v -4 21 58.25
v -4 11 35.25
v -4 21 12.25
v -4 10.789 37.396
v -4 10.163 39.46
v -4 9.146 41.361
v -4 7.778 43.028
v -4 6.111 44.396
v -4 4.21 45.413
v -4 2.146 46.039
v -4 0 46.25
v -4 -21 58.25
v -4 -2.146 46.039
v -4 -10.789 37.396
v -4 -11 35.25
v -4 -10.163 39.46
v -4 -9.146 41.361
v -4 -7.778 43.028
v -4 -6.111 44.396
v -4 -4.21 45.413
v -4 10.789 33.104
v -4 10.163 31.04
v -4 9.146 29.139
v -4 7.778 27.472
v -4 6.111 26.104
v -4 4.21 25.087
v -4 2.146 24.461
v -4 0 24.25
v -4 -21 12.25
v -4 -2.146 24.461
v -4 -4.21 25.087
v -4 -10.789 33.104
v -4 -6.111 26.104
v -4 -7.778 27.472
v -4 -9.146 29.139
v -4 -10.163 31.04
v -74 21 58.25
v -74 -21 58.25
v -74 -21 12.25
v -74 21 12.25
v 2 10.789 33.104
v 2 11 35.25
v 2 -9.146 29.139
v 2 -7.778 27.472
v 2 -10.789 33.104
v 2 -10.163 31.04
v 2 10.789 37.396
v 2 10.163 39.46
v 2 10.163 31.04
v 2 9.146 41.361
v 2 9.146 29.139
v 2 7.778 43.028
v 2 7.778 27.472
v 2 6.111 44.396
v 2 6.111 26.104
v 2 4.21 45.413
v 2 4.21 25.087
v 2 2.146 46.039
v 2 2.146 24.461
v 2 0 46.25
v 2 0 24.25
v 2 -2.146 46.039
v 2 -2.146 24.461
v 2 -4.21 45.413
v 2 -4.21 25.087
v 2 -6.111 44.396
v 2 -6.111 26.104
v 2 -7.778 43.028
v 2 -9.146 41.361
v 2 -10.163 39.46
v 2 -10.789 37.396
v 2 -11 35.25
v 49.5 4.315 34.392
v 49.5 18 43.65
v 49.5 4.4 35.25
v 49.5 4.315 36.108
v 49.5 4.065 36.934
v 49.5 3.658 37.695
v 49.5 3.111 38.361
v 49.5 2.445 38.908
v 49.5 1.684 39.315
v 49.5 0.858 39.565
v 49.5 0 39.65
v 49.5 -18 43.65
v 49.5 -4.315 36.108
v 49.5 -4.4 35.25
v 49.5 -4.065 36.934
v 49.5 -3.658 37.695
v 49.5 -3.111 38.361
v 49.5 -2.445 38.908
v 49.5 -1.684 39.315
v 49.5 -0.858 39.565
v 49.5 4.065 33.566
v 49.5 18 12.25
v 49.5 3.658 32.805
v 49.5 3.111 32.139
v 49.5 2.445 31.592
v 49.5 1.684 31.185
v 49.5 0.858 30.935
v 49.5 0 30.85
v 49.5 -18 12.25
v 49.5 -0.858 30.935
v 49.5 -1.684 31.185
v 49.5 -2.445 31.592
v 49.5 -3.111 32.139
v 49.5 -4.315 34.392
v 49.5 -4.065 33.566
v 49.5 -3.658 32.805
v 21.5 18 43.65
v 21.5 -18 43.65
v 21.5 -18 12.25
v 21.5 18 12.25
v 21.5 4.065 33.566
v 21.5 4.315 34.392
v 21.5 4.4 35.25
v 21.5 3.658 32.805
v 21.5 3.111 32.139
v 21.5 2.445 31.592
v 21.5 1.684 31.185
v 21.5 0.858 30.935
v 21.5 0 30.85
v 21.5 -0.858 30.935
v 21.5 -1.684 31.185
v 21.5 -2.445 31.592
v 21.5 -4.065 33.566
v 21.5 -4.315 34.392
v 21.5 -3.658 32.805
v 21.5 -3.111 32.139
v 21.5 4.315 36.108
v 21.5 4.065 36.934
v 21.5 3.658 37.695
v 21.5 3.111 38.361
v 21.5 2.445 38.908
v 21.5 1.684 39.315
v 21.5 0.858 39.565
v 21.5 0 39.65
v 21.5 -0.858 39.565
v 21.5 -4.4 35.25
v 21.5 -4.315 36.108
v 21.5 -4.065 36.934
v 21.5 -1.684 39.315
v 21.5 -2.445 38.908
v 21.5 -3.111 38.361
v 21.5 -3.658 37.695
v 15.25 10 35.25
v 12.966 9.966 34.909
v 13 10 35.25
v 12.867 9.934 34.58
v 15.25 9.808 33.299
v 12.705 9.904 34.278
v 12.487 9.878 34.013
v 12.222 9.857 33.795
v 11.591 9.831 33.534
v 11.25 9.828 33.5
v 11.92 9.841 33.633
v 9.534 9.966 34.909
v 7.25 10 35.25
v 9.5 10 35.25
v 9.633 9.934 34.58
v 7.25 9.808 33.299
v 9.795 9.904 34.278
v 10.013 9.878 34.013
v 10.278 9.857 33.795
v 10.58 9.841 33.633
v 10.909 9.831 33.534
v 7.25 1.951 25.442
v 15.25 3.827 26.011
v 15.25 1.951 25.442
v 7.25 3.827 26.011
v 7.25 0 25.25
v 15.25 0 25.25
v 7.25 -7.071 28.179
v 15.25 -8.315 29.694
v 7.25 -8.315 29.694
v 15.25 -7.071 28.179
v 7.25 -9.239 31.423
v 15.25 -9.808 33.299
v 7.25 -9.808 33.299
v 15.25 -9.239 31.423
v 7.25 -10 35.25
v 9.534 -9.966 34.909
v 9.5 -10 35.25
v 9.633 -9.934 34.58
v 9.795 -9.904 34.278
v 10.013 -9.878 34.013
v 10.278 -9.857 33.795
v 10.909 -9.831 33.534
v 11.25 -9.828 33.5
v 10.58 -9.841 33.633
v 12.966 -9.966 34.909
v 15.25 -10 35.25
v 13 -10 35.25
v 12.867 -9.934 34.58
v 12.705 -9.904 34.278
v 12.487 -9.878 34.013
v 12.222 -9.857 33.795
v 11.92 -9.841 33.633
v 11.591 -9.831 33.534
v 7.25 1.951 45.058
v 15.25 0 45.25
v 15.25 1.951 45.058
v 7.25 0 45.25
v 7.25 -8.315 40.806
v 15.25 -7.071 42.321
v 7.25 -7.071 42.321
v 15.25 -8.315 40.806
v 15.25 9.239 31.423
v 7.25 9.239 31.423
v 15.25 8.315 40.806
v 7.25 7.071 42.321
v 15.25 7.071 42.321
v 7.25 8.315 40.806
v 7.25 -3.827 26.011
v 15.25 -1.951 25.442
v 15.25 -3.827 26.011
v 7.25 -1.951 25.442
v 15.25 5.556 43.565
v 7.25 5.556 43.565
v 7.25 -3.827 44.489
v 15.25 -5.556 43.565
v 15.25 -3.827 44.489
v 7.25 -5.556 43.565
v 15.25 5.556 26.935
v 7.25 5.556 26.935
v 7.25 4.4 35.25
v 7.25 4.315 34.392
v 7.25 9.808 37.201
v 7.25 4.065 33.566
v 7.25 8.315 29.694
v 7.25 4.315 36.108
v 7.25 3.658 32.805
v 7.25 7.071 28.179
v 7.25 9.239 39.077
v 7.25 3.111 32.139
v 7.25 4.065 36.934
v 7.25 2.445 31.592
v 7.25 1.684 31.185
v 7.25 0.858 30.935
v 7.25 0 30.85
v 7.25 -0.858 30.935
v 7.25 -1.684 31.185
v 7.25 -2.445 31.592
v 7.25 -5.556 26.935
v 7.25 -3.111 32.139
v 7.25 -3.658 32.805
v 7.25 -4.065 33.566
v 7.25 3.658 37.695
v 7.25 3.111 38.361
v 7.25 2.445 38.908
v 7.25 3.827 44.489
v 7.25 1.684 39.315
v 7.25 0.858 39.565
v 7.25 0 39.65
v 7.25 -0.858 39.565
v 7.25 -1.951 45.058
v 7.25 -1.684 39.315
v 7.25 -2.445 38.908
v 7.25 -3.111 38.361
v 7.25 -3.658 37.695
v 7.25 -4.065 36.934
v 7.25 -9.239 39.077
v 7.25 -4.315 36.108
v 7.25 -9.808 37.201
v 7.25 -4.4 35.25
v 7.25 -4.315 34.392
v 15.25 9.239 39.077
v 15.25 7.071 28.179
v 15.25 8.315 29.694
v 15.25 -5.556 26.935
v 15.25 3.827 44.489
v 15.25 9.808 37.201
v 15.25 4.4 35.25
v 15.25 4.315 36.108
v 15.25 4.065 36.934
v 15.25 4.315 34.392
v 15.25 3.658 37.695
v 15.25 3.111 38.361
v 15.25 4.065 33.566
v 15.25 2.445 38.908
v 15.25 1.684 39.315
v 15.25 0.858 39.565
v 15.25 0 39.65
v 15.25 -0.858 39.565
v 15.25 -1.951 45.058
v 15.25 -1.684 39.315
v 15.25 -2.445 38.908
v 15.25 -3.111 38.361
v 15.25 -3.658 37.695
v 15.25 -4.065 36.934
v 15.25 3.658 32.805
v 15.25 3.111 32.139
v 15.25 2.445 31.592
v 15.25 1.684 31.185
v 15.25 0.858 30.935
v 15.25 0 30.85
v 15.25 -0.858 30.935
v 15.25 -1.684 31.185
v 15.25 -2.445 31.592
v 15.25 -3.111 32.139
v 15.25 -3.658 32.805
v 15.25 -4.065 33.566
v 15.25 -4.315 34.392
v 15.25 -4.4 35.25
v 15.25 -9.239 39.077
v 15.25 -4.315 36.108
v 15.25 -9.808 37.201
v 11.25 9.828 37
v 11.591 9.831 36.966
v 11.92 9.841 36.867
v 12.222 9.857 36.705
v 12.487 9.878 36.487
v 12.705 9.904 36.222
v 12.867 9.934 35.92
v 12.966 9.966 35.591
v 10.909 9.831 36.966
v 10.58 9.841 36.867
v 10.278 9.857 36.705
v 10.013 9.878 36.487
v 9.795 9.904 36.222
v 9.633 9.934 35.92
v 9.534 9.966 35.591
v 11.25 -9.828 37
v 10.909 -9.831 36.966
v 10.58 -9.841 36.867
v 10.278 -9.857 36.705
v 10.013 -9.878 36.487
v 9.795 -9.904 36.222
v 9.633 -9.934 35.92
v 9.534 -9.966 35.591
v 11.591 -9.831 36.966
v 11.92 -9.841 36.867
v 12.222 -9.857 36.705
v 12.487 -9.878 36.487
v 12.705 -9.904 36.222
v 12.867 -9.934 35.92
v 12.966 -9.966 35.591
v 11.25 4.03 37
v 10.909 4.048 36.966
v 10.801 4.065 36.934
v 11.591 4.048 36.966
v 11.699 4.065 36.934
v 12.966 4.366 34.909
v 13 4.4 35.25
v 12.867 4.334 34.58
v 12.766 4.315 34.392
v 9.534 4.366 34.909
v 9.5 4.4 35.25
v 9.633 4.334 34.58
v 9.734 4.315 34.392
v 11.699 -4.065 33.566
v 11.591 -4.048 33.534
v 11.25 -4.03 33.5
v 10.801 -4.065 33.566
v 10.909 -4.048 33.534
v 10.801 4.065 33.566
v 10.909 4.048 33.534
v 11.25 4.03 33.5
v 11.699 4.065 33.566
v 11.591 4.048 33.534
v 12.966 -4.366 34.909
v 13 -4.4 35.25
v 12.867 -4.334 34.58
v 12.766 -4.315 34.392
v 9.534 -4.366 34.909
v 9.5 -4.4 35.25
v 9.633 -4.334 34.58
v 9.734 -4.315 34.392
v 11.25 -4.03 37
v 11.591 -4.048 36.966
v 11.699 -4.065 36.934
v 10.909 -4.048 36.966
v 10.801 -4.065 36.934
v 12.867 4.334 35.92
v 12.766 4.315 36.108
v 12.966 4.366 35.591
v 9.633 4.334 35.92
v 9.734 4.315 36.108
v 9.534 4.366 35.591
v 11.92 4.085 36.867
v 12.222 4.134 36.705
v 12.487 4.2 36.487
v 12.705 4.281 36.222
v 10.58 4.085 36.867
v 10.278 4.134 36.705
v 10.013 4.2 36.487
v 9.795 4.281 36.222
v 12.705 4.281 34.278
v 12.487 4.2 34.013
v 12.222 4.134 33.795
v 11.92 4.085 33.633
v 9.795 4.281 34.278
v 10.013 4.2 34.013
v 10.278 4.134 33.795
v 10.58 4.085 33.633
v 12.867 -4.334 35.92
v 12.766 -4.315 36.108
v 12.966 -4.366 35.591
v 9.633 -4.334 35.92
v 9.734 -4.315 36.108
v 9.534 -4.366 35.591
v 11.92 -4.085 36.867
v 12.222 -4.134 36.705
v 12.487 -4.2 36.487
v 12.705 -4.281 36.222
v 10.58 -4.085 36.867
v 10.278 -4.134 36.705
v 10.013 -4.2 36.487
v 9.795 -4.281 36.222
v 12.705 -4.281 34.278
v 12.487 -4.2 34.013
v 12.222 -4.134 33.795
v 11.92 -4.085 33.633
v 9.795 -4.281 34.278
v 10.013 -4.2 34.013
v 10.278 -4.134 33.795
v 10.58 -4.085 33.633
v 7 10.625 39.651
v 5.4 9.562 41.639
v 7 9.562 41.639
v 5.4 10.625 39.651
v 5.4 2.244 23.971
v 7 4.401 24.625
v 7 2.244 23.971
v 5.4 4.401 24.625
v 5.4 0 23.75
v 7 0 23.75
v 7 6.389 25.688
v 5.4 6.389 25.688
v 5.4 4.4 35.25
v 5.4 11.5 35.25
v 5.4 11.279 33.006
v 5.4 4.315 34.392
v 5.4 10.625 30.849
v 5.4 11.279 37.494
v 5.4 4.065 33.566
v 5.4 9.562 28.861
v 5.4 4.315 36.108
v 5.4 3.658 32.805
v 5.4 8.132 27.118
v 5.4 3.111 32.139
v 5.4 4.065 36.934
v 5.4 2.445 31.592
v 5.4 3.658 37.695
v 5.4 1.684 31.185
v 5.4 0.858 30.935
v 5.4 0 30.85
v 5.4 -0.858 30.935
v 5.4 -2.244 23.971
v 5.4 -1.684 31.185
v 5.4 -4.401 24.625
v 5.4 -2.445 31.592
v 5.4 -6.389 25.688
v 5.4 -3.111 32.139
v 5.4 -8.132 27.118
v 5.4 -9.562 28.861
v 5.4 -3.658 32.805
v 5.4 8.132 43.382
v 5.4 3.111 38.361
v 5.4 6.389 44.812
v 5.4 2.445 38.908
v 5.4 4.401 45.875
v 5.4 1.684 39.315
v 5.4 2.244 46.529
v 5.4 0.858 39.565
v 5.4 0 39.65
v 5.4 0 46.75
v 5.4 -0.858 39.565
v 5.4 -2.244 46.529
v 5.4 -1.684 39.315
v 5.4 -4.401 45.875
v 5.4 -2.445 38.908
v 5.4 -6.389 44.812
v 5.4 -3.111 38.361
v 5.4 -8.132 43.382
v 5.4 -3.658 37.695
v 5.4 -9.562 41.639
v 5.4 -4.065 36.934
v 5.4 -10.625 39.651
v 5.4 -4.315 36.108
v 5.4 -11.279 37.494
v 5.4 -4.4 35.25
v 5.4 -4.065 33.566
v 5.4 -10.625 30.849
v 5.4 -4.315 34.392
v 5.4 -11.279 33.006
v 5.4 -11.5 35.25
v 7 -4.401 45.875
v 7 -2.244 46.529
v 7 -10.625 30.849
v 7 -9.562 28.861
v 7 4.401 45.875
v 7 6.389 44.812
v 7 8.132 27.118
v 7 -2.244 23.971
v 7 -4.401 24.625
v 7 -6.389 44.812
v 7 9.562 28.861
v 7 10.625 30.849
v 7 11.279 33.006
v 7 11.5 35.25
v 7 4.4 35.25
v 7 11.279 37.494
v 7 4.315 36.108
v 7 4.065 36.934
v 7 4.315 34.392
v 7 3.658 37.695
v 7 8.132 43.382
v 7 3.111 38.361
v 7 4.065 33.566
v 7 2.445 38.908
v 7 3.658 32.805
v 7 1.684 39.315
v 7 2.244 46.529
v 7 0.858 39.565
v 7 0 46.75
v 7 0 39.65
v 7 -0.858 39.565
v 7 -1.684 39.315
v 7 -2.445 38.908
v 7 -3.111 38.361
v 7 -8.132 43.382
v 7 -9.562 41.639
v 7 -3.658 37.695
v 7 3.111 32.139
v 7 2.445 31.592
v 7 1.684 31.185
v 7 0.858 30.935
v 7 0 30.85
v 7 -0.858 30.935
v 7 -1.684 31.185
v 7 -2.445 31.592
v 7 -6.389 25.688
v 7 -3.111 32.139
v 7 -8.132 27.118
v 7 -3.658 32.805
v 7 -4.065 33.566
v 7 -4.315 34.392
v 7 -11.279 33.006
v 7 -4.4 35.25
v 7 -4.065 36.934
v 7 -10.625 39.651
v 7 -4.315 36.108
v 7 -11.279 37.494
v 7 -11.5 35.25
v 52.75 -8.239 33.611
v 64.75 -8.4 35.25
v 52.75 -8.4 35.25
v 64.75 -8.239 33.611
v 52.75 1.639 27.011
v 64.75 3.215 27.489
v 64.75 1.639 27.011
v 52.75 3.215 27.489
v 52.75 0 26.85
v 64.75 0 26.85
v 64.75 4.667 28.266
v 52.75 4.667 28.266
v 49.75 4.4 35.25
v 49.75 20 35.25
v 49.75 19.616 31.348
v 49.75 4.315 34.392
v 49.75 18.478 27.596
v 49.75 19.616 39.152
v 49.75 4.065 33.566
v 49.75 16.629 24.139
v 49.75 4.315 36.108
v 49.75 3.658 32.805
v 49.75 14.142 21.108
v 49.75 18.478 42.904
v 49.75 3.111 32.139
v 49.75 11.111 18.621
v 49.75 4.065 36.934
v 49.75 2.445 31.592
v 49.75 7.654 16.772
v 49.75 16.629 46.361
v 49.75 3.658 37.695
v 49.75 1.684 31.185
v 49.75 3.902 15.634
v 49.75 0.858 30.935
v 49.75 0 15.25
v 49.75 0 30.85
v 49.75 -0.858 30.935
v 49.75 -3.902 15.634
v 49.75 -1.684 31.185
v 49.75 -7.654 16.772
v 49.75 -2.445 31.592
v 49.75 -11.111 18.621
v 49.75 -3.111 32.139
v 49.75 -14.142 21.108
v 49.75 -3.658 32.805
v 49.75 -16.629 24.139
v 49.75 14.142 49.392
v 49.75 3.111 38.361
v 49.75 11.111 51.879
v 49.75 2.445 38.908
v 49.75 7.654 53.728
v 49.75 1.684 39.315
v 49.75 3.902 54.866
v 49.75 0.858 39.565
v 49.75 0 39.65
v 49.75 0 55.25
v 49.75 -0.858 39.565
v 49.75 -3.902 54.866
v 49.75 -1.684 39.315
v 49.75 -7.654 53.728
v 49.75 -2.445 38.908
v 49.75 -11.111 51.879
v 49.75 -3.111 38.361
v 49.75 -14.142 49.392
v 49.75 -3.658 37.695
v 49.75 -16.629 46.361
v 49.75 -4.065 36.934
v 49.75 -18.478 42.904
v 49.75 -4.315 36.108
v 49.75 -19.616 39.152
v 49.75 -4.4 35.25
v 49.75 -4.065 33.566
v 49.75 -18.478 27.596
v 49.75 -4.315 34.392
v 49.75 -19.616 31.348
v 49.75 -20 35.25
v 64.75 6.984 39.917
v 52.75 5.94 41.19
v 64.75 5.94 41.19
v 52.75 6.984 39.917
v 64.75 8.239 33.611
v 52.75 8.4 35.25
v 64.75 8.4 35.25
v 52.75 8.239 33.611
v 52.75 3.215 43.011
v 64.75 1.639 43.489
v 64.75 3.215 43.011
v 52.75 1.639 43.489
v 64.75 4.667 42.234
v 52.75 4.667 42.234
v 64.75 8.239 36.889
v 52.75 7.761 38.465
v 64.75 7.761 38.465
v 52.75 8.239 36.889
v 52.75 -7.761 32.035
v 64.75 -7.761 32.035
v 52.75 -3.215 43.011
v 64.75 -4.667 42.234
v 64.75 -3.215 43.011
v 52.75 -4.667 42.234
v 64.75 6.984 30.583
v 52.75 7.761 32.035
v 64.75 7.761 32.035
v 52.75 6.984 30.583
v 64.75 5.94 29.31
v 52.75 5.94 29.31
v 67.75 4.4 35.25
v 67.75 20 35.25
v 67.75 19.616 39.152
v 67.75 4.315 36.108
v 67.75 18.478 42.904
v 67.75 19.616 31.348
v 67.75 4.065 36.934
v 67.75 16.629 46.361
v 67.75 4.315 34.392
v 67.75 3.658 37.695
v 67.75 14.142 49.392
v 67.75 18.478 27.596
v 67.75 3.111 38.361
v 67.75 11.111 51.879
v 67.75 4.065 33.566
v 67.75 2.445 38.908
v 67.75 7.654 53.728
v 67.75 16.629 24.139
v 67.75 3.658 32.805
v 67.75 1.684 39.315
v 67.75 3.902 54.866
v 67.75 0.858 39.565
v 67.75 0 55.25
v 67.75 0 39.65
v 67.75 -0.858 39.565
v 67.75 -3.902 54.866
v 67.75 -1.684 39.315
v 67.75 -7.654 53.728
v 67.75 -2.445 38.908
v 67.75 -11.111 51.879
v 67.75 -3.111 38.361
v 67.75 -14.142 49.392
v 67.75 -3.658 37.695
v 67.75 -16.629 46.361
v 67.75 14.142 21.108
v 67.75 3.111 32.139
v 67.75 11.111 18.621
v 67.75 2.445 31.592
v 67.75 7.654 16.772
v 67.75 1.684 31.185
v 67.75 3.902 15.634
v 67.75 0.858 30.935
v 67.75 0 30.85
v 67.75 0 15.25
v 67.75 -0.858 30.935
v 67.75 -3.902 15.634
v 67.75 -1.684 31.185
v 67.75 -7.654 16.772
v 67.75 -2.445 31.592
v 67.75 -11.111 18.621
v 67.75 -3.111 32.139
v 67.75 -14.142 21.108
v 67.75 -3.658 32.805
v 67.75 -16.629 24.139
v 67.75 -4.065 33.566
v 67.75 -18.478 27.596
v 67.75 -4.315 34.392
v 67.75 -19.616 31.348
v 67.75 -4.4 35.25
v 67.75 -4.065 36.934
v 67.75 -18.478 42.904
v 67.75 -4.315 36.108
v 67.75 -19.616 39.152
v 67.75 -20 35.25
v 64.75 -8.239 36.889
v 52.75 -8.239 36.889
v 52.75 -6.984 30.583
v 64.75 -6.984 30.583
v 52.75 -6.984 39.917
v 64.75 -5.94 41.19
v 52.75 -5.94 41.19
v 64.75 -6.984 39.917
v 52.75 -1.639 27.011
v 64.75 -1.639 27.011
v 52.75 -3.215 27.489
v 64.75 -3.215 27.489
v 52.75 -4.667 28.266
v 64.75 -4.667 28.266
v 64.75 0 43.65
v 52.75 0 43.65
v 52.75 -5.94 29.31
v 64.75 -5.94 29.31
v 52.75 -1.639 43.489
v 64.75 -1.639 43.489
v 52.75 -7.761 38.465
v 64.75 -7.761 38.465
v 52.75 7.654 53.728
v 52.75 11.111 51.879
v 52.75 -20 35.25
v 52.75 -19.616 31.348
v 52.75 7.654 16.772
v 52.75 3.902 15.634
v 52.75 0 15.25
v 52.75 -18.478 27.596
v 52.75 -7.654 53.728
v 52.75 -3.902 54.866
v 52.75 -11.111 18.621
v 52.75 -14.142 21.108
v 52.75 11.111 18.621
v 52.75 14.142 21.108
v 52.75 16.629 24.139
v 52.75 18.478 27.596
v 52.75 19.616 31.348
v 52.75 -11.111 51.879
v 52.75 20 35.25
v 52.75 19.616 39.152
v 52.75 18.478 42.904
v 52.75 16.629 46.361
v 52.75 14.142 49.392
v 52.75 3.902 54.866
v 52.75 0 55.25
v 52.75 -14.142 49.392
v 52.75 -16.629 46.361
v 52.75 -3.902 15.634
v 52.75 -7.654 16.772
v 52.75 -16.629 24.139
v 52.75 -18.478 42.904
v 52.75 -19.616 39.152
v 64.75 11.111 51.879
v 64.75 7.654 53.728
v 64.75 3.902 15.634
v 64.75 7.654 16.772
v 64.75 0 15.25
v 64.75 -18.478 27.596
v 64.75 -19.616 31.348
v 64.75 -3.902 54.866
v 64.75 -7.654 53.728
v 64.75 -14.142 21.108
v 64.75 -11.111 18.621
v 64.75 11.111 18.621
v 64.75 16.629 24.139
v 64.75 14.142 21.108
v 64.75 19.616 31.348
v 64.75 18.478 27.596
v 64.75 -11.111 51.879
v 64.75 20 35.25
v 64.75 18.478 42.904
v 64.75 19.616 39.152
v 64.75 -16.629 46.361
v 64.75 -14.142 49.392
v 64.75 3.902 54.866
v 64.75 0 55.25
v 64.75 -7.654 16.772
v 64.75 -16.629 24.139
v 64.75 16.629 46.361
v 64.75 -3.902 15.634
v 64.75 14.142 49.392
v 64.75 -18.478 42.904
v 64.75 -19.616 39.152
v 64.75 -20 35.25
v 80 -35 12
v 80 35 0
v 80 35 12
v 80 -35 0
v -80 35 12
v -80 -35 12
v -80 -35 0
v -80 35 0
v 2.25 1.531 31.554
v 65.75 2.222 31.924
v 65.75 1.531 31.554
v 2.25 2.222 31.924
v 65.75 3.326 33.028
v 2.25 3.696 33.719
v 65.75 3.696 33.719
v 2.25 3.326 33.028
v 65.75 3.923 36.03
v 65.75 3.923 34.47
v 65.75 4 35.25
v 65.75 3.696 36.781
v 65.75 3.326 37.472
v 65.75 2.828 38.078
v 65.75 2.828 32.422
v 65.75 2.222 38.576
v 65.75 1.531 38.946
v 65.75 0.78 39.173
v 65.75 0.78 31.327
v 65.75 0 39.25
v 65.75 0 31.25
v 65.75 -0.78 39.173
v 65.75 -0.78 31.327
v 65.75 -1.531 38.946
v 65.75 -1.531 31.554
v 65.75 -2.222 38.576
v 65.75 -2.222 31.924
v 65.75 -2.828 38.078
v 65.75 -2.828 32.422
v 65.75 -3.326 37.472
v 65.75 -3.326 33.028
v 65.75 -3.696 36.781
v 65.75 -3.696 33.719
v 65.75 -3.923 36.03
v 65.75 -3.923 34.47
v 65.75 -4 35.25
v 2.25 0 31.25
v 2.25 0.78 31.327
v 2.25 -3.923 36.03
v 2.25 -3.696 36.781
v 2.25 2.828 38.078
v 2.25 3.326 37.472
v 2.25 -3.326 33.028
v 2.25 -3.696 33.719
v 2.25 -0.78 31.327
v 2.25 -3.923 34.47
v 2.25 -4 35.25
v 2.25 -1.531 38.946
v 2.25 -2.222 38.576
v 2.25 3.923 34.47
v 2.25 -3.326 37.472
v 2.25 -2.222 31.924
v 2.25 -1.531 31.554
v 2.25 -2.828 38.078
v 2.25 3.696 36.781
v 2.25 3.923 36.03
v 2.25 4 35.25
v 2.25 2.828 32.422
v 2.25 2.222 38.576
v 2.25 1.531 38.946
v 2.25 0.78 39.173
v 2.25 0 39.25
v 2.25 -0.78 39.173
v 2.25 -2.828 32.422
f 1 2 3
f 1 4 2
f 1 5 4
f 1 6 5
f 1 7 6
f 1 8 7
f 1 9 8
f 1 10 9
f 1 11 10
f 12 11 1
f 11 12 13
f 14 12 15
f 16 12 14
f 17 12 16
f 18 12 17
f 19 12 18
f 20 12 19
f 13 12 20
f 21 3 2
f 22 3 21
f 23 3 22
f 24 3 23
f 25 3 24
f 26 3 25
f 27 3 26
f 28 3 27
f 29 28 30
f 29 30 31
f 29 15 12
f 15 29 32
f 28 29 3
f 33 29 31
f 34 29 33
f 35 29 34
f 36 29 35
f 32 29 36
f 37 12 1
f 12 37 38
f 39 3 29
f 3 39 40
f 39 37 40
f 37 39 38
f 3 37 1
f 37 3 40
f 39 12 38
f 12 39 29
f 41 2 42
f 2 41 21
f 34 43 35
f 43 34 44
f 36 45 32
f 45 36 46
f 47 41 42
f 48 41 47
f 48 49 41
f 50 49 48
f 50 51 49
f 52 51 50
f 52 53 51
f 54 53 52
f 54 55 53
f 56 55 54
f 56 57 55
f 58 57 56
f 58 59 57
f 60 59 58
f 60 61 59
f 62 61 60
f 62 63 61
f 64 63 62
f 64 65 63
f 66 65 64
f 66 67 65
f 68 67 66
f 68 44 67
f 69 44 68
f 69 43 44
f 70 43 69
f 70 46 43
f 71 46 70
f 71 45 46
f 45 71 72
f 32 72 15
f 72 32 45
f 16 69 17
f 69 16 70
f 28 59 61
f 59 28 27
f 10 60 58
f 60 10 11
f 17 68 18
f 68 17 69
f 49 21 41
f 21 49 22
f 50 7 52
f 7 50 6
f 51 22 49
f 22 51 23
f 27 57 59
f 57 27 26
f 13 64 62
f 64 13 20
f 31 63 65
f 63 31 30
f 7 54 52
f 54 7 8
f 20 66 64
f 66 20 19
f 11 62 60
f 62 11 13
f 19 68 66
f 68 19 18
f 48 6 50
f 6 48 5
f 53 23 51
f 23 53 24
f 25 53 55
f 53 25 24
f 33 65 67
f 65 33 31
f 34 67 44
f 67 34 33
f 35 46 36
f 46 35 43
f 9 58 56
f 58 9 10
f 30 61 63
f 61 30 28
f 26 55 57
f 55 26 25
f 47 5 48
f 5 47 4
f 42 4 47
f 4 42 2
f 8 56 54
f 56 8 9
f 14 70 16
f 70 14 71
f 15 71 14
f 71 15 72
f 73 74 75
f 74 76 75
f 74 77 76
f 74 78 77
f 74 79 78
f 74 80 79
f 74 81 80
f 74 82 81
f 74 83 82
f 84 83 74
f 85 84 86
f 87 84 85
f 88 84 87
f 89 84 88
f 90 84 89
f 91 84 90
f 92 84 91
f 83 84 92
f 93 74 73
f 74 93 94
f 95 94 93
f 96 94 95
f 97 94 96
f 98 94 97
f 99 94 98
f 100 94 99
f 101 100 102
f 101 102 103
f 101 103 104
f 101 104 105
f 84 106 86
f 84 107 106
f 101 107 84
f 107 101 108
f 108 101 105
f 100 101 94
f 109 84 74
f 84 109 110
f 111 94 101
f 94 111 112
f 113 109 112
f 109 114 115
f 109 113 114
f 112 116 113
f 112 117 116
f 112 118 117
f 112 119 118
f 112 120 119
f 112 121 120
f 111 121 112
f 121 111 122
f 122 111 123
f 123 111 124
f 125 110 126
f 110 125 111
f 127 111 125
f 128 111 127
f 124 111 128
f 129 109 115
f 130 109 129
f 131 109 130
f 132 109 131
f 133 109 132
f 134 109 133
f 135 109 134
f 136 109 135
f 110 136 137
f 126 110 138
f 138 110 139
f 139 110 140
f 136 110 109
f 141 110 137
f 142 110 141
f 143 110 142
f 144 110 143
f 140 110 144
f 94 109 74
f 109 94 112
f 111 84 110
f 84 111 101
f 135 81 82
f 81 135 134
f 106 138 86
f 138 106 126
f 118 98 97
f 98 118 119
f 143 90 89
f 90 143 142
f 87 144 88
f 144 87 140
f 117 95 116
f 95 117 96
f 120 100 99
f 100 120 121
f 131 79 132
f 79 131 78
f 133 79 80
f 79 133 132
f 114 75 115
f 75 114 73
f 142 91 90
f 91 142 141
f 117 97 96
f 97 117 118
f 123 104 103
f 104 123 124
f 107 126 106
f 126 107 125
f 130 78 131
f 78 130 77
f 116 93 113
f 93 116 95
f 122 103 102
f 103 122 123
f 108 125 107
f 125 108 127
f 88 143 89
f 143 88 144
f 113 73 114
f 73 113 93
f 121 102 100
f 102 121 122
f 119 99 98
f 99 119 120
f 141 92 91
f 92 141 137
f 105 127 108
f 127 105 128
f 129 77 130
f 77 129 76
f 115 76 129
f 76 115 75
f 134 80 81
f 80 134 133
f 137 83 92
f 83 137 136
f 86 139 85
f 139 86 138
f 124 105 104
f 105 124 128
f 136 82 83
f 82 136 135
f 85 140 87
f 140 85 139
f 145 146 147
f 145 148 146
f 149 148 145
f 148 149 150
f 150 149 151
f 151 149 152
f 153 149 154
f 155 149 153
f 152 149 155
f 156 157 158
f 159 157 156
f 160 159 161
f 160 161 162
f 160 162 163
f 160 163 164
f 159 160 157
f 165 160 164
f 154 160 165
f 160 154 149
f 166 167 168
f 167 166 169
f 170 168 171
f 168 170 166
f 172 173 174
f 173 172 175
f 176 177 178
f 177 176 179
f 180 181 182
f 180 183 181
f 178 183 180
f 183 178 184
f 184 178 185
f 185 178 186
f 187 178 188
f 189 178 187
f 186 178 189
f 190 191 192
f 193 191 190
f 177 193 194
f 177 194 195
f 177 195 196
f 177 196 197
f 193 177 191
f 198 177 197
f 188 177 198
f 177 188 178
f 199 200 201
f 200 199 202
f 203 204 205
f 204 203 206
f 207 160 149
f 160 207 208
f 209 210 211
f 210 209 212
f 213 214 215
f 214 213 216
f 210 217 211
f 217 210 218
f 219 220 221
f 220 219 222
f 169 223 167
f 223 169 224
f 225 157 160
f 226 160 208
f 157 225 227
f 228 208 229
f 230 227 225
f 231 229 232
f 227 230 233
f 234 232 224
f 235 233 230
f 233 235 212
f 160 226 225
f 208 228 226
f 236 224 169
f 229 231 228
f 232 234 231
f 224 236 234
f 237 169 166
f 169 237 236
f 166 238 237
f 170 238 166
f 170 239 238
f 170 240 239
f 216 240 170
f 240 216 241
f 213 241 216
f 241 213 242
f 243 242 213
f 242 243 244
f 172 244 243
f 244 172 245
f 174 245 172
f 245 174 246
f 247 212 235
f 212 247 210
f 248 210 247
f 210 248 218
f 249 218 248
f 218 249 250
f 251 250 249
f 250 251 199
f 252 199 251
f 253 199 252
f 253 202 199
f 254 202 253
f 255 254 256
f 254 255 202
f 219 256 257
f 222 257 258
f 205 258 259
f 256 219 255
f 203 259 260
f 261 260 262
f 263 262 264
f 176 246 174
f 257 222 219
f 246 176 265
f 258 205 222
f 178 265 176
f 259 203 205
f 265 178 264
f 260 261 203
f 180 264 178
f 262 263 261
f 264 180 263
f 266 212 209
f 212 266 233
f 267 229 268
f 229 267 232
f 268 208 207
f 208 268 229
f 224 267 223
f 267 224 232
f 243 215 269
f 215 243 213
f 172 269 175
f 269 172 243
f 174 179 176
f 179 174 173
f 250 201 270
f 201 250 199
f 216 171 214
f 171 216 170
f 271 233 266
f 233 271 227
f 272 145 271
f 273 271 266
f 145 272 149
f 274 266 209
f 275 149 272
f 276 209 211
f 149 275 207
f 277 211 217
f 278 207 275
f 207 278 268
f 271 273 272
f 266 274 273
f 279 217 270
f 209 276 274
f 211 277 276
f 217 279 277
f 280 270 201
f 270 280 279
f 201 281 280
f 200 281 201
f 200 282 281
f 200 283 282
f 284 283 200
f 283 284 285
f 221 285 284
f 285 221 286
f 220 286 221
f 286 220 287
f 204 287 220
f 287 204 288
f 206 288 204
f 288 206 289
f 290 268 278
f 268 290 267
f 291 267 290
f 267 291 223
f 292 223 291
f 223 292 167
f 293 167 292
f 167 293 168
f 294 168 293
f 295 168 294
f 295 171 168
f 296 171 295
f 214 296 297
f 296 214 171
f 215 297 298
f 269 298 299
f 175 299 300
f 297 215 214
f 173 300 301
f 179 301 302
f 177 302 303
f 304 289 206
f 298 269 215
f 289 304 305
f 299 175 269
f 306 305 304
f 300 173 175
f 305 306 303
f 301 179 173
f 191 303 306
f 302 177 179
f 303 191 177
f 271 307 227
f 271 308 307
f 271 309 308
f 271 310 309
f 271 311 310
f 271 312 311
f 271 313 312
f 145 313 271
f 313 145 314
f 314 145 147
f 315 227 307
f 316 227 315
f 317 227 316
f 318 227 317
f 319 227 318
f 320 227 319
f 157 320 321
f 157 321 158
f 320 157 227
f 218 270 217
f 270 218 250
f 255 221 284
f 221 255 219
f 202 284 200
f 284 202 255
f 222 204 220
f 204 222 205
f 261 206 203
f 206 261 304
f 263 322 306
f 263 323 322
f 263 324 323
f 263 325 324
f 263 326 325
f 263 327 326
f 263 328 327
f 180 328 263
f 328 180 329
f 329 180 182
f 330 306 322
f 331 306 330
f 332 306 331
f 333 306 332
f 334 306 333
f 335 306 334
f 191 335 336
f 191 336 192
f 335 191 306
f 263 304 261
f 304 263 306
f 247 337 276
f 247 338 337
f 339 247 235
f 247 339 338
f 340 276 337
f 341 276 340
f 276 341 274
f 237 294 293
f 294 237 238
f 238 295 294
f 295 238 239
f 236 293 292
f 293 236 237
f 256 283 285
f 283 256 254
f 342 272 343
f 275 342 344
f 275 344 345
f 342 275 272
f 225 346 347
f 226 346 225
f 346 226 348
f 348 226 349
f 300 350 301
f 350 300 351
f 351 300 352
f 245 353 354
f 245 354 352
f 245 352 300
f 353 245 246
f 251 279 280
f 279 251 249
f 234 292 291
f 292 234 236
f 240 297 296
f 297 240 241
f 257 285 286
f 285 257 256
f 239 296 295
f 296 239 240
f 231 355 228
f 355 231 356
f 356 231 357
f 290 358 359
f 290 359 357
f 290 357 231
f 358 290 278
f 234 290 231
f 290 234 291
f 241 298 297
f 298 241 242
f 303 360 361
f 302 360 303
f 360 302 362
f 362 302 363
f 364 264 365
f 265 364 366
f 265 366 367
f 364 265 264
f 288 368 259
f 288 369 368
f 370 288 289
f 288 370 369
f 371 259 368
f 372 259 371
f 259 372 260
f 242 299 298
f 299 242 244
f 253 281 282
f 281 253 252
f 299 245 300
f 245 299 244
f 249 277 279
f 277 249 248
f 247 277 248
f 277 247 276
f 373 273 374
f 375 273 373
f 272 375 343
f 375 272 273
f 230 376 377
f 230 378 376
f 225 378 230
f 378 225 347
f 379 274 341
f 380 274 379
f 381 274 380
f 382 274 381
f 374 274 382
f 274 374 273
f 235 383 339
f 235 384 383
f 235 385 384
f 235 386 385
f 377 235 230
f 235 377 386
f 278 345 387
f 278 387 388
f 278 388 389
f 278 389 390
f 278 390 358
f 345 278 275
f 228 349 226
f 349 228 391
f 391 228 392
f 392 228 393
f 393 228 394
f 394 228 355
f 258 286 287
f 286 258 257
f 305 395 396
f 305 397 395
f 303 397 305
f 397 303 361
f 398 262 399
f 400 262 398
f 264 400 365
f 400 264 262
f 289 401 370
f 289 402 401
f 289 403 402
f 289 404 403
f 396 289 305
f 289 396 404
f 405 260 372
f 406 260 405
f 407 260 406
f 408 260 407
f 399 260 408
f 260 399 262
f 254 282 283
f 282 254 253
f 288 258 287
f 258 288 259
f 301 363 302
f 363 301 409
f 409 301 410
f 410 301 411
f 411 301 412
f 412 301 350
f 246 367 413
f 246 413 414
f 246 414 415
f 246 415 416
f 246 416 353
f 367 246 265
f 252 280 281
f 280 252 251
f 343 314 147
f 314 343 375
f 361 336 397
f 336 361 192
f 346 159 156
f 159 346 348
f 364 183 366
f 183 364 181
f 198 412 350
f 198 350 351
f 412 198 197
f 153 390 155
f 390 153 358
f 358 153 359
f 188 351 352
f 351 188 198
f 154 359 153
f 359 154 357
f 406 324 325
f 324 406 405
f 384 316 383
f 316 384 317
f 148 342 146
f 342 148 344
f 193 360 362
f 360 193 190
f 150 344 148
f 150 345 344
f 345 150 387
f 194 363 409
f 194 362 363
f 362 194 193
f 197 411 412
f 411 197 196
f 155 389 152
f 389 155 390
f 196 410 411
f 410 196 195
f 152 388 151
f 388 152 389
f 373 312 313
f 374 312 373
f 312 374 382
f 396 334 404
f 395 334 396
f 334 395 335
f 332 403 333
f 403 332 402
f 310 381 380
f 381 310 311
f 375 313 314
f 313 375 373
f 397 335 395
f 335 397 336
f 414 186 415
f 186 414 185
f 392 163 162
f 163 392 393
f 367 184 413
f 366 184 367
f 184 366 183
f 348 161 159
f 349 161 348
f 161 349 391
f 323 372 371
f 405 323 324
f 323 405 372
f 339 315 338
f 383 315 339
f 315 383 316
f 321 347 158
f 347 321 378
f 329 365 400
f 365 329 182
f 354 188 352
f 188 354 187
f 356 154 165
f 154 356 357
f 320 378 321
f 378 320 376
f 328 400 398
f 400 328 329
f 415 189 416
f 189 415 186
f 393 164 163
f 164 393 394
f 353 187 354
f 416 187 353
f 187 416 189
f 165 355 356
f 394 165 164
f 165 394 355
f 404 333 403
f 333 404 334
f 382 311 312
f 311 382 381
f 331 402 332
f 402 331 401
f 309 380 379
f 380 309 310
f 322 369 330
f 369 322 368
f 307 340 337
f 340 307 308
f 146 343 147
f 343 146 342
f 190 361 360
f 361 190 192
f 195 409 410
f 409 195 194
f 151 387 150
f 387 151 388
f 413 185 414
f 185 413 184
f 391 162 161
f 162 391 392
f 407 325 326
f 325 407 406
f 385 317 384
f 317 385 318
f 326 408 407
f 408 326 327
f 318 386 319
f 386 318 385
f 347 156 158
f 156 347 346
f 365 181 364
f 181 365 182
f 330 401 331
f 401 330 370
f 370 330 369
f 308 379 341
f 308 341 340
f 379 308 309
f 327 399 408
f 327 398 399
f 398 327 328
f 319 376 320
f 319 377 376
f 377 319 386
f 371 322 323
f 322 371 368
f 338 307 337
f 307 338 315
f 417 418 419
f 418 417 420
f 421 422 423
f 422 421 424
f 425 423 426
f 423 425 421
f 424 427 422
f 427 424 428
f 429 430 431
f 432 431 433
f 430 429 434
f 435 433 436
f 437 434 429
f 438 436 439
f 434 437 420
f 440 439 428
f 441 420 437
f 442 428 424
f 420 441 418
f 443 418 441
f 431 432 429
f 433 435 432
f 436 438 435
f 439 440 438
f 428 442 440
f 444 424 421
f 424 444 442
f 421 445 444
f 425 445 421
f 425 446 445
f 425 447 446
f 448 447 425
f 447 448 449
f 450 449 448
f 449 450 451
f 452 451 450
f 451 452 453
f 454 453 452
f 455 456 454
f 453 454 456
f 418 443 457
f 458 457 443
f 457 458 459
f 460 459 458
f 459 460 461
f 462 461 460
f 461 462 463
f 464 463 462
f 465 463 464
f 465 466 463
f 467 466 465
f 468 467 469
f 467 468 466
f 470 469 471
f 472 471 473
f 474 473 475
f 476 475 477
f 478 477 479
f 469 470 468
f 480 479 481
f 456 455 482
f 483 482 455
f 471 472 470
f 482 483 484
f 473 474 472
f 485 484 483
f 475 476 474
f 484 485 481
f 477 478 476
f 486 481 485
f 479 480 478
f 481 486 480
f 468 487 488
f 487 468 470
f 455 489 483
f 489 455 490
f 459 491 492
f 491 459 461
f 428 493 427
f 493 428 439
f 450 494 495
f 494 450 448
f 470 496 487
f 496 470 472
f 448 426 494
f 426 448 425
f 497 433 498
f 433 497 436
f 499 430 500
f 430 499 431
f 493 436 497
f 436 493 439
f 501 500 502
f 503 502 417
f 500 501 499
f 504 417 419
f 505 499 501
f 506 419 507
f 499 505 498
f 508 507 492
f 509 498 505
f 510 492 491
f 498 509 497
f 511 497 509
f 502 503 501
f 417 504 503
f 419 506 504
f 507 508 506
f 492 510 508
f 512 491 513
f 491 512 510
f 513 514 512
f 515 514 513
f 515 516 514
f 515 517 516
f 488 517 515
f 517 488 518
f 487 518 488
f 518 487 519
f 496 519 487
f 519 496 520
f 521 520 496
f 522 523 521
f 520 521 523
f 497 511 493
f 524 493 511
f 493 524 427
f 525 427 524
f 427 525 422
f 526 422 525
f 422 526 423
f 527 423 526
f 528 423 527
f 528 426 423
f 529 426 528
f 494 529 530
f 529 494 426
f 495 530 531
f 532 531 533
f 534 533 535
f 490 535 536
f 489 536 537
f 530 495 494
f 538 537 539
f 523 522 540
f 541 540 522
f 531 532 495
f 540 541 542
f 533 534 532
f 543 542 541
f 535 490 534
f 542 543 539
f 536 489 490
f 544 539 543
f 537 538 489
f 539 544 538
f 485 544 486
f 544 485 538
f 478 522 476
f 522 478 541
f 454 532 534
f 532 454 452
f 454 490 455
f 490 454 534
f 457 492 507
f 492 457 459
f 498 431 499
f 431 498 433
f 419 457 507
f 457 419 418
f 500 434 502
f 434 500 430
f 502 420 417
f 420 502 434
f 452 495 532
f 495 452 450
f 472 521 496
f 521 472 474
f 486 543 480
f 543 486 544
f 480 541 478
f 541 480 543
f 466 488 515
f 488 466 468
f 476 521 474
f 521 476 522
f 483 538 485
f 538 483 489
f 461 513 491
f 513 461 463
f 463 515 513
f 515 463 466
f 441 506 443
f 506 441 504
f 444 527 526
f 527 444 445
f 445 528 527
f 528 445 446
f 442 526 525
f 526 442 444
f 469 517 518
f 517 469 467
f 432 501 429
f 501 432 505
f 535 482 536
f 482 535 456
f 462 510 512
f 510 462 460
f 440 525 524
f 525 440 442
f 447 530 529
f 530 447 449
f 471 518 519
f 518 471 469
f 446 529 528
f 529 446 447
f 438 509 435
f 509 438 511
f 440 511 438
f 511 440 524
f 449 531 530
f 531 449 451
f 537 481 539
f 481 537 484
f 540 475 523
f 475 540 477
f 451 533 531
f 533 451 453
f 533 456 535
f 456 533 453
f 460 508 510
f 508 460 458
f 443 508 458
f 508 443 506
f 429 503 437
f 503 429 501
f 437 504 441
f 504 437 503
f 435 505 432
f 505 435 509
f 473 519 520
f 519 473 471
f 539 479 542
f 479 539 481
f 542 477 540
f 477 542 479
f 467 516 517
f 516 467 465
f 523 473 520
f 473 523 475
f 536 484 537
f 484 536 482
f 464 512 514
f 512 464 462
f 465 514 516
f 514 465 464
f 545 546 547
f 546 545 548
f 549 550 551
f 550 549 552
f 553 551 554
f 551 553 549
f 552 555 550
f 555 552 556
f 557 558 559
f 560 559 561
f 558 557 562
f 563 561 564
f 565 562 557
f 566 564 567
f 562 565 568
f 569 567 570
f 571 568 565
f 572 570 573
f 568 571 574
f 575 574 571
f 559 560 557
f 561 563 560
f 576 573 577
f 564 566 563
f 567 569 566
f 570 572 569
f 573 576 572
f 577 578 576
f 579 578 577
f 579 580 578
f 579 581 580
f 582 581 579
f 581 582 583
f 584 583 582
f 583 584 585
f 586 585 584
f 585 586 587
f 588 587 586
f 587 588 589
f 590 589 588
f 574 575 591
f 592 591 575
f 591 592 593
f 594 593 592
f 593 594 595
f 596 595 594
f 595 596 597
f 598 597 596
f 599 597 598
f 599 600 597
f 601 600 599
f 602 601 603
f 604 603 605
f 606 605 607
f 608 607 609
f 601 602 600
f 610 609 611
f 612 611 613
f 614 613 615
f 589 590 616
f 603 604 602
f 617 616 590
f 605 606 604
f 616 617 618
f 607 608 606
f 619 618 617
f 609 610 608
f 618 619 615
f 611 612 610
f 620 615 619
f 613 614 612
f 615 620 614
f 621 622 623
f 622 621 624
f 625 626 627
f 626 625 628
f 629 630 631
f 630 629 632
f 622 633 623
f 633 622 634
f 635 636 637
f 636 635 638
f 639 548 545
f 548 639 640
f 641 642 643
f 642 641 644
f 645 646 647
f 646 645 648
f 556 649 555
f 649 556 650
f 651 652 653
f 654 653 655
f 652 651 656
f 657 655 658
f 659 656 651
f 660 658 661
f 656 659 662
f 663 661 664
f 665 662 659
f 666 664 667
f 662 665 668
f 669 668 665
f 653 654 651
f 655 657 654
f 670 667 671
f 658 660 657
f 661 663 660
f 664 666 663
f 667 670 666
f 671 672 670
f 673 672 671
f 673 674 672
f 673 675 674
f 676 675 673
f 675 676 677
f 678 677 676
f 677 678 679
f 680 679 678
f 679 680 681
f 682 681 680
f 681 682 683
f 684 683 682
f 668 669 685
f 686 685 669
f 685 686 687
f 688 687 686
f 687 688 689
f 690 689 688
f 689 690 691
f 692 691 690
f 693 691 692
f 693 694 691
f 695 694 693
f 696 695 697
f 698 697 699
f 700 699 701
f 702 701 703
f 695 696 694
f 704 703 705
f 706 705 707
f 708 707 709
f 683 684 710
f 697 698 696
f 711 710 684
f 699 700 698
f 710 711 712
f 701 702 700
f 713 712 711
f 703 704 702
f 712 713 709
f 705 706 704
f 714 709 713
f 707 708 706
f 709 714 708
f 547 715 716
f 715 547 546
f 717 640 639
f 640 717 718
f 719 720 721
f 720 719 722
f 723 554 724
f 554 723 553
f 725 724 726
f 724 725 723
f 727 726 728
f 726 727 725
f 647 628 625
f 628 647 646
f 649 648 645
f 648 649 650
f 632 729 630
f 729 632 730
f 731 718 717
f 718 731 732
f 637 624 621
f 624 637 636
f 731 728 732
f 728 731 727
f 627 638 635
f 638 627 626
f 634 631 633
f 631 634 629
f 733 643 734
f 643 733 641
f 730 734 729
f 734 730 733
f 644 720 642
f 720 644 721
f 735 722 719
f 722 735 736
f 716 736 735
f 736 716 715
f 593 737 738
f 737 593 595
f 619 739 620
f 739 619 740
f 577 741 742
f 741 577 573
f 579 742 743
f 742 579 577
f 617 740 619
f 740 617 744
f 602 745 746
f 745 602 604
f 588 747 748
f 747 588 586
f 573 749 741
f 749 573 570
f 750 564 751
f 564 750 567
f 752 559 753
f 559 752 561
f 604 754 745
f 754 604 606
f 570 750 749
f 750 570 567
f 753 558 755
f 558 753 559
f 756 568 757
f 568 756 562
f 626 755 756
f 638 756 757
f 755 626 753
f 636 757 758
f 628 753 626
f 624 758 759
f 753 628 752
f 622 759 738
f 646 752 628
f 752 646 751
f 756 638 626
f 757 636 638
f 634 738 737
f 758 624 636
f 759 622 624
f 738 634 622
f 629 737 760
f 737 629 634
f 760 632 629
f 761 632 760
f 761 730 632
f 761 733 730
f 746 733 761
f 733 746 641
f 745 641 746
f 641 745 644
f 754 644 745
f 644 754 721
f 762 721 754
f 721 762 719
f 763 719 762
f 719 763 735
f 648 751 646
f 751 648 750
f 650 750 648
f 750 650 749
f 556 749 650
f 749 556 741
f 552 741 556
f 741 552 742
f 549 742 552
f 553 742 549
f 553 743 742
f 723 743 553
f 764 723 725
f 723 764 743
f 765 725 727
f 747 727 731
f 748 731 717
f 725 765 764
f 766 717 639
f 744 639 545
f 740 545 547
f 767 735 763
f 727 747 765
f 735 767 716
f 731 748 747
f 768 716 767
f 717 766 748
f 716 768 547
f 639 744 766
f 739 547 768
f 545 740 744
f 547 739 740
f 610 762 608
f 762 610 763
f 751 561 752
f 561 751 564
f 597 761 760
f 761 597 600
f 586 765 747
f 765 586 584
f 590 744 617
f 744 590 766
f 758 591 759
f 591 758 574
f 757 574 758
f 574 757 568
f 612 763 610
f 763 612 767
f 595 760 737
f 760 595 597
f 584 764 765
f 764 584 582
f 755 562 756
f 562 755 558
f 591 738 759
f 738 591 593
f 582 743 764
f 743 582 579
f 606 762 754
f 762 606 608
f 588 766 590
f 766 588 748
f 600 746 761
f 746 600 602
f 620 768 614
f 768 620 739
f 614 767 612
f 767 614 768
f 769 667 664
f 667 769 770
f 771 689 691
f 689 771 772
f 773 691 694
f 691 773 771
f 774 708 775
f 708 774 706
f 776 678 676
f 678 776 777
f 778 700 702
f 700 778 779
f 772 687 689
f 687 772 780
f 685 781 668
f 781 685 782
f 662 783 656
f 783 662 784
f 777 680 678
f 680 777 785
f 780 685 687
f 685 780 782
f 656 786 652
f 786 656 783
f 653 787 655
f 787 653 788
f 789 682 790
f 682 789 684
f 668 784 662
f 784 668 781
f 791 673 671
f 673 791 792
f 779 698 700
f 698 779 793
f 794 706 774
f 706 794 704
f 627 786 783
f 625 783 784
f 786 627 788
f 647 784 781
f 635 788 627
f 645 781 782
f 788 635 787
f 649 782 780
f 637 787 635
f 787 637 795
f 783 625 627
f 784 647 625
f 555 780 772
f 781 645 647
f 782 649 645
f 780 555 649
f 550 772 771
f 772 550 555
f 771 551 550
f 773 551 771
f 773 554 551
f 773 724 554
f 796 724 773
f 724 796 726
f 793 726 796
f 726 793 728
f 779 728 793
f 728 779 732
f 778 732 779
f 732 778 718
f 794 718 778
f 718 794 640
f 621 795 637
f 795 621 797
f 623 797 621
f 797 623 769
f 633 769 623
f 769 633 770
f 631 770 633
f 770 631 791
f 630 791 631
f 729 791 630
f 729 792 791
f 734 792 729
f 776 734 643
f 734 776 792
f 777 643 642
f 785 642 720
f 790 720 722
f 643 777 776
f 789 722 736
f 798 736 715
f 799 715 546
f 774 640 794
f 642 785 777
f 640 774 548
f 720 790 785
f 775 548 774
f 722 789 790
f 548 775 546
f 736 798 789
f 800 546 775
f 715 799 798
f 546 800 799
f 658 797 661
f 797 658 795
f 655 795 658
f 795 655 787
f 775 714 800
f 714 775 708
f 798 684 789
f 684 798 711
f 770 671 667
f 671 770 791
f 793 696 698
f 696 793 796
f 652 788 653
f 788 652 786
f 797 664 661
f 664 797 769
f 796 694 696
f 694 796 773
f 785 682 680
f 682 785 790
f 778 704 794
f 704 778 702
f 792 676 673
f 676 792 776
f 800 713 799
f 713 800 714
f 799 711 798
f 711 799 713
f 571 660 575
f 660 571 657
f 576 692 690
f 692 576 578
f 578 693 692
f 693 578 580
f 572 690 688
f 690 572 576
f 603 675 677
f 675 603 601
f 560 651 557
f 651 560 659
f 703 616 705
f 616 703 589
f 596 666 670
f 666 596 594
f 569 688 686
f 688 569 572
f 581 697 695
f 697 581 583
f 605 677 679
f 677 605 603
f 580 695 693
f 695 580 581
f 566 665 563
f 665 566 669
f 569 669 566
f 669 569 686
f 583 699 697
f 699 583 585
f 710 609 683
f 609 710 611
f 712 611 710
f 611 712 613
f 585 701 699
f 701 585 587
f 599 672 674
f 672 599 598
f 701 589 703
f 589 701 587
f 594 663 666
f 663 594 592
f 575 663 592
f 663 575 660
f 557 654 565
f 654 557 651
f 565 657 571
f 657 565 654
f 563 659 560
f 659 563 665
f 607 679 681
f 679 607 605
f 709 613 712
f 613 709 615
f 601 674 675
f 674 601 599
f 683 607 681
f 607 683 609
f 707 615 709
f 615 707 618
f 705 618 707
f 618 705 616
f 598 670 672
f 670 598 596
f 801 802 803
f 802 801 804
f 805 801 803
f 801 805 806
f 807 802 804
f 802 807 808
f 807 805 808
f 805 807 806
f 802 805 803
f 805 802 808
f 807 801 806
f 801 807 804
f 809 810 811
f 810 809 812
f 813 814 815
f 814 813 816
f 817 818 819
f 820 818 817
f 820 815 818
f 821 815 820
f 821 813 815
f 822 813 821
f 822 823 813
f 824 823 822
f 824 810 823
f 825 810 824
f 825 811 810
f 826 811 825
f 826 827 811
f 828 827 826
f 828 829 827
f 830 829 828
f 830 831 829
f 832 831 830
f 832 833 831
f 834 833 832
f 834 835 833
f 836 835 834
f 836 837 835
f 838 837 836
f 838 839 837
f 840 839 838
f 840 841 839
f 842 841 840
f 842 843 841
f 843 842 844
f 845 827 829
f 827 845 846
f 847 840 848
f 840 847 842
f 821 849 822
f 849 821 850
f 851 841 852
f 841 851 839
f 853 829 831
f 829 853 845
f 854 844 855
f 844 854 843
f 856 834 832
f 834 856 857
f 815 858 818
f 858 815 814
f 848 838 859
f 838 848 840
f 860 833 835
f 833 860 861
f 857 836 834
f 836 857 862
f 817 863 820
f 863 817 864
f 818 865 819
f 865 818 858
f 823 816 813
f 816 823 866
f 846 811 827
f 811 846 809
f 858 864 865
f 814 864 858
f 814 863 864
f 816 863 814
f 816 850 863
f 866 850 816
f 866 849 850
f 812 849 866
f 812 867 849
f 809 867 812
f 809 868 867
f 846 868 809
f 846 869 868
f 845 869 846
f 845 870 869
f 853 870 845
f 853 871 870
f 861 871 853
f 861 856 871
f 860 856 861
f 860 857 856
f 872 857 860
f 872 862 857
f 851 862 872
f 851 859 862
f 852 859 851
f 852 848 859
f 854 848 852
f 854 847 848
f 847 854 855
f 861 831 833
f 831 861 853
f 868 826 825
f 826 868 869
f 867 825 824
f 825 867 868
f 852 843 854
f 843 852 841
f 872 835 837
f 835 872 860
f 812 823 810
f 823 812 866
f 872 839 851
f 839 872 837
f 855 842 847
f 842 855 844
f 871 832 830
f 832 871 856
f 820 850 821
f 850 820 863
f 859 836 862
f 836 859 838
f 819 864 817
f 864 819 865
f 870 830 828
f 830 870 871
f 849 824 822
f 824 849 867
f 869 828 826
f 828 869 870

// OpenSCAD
$fn = 32;

// ------------------------------------------------------------------------
// Motor drive station: motor 70 x 46 mm, shaft d8, pulley d40
// Every part is its own module, assembly() places every instance.
// ------------------------------------------------------------------------

// --- part 1 ---
module station_bed() {
  difference() {
    translate([-80, -35, 0]) cube([160, 70, 12]);
  }
}

// --- part 2 ---
module drive_motor() {
  union() {
    translate([-35, -21, 0]) cube([70, 42, 46]);
    translate([38, 0, 23]) rotate([0, 90, 0]) cylinder(h = 6, d = 22, center = true);
  }
}

// --- part 3 ---
module pillow_block() {
  difference() {
    translate([-14, -18, 0]) cube([28, 36, 31.4]);
    translate([0, 0, 23]) rotate([0, 90, 0]) cylinder(h = 30, d = 8.8, center = true);
  }
}

// --- part 4 ---
module drive_shaft() {
  translate([0, 0, -31.75]) cylinder(h = 63.5, d = 8);
}

// --- part 5 ---
module shaft_collar() {
  difference() {
    cylinder(h = 8, d = 20);
    translate([0, 0, -1]) cylinder(h = 10, d = 8.8);
    translate([0, 0, 4]) rotate([90, 0, 0]) cylinder(h = 22, d = 3.5, center = true);
  }
}

// --- part 6 ---
module collar_washer() {
  difference() {
      translate([0, 0, 0]) cylinder(h = 1.6, d = 23);
      translate([0, 0, -1]) cylinder(h = 3.6, d = 8.8);
    }
}

// --- part 7 ---
module drive_pulley() {
  difference() {
    union() {
      cylinder(h = 18, d = 16.8);
      cylinder(h = 3, d = 40);
      translate([0, 0, 15]) cylinder(h = 3, d = 40);
    }
    translate([0, 0, -1]) cylinder(h = 20, d = 8.8);
  }
}

// --- assembly ---
module assembly() {
  color([0.80, 0.24, 0.20]) translate([0, 0, 0]) rotate([0, 0, 0]) station_bed();
  color([0.20, 0.45, 0.75]) translate([-39, 0, 12.25]) rotate([0, 0, 0]) drive_motor();
  color([0.25, 0.62, 0.32]) translate([35.5, 0, 12.25]) rotate([0, 0, 0]) pillow_block();
  color([0.92, 0.70, 0.18]) translate([34, 0, 35.25]) rotate([0, 90, 0]) drive_shaft();
  color([0.58, 0.35, 0.70]) translate([7.25, 0, 35.25]) rotate([0, 90, 0]) shaft_collar();
  color([0.16, 0.66, 0.66]) translate([5.4, 0, 35.25]) rotate([0, 90, 0]) collar_washer();
  color([0.85, 0.48, 0.18]) translate([49.75, 0, 35.25]) rotate([0, 90, 0]) drive_pulley();
}

assembly();
